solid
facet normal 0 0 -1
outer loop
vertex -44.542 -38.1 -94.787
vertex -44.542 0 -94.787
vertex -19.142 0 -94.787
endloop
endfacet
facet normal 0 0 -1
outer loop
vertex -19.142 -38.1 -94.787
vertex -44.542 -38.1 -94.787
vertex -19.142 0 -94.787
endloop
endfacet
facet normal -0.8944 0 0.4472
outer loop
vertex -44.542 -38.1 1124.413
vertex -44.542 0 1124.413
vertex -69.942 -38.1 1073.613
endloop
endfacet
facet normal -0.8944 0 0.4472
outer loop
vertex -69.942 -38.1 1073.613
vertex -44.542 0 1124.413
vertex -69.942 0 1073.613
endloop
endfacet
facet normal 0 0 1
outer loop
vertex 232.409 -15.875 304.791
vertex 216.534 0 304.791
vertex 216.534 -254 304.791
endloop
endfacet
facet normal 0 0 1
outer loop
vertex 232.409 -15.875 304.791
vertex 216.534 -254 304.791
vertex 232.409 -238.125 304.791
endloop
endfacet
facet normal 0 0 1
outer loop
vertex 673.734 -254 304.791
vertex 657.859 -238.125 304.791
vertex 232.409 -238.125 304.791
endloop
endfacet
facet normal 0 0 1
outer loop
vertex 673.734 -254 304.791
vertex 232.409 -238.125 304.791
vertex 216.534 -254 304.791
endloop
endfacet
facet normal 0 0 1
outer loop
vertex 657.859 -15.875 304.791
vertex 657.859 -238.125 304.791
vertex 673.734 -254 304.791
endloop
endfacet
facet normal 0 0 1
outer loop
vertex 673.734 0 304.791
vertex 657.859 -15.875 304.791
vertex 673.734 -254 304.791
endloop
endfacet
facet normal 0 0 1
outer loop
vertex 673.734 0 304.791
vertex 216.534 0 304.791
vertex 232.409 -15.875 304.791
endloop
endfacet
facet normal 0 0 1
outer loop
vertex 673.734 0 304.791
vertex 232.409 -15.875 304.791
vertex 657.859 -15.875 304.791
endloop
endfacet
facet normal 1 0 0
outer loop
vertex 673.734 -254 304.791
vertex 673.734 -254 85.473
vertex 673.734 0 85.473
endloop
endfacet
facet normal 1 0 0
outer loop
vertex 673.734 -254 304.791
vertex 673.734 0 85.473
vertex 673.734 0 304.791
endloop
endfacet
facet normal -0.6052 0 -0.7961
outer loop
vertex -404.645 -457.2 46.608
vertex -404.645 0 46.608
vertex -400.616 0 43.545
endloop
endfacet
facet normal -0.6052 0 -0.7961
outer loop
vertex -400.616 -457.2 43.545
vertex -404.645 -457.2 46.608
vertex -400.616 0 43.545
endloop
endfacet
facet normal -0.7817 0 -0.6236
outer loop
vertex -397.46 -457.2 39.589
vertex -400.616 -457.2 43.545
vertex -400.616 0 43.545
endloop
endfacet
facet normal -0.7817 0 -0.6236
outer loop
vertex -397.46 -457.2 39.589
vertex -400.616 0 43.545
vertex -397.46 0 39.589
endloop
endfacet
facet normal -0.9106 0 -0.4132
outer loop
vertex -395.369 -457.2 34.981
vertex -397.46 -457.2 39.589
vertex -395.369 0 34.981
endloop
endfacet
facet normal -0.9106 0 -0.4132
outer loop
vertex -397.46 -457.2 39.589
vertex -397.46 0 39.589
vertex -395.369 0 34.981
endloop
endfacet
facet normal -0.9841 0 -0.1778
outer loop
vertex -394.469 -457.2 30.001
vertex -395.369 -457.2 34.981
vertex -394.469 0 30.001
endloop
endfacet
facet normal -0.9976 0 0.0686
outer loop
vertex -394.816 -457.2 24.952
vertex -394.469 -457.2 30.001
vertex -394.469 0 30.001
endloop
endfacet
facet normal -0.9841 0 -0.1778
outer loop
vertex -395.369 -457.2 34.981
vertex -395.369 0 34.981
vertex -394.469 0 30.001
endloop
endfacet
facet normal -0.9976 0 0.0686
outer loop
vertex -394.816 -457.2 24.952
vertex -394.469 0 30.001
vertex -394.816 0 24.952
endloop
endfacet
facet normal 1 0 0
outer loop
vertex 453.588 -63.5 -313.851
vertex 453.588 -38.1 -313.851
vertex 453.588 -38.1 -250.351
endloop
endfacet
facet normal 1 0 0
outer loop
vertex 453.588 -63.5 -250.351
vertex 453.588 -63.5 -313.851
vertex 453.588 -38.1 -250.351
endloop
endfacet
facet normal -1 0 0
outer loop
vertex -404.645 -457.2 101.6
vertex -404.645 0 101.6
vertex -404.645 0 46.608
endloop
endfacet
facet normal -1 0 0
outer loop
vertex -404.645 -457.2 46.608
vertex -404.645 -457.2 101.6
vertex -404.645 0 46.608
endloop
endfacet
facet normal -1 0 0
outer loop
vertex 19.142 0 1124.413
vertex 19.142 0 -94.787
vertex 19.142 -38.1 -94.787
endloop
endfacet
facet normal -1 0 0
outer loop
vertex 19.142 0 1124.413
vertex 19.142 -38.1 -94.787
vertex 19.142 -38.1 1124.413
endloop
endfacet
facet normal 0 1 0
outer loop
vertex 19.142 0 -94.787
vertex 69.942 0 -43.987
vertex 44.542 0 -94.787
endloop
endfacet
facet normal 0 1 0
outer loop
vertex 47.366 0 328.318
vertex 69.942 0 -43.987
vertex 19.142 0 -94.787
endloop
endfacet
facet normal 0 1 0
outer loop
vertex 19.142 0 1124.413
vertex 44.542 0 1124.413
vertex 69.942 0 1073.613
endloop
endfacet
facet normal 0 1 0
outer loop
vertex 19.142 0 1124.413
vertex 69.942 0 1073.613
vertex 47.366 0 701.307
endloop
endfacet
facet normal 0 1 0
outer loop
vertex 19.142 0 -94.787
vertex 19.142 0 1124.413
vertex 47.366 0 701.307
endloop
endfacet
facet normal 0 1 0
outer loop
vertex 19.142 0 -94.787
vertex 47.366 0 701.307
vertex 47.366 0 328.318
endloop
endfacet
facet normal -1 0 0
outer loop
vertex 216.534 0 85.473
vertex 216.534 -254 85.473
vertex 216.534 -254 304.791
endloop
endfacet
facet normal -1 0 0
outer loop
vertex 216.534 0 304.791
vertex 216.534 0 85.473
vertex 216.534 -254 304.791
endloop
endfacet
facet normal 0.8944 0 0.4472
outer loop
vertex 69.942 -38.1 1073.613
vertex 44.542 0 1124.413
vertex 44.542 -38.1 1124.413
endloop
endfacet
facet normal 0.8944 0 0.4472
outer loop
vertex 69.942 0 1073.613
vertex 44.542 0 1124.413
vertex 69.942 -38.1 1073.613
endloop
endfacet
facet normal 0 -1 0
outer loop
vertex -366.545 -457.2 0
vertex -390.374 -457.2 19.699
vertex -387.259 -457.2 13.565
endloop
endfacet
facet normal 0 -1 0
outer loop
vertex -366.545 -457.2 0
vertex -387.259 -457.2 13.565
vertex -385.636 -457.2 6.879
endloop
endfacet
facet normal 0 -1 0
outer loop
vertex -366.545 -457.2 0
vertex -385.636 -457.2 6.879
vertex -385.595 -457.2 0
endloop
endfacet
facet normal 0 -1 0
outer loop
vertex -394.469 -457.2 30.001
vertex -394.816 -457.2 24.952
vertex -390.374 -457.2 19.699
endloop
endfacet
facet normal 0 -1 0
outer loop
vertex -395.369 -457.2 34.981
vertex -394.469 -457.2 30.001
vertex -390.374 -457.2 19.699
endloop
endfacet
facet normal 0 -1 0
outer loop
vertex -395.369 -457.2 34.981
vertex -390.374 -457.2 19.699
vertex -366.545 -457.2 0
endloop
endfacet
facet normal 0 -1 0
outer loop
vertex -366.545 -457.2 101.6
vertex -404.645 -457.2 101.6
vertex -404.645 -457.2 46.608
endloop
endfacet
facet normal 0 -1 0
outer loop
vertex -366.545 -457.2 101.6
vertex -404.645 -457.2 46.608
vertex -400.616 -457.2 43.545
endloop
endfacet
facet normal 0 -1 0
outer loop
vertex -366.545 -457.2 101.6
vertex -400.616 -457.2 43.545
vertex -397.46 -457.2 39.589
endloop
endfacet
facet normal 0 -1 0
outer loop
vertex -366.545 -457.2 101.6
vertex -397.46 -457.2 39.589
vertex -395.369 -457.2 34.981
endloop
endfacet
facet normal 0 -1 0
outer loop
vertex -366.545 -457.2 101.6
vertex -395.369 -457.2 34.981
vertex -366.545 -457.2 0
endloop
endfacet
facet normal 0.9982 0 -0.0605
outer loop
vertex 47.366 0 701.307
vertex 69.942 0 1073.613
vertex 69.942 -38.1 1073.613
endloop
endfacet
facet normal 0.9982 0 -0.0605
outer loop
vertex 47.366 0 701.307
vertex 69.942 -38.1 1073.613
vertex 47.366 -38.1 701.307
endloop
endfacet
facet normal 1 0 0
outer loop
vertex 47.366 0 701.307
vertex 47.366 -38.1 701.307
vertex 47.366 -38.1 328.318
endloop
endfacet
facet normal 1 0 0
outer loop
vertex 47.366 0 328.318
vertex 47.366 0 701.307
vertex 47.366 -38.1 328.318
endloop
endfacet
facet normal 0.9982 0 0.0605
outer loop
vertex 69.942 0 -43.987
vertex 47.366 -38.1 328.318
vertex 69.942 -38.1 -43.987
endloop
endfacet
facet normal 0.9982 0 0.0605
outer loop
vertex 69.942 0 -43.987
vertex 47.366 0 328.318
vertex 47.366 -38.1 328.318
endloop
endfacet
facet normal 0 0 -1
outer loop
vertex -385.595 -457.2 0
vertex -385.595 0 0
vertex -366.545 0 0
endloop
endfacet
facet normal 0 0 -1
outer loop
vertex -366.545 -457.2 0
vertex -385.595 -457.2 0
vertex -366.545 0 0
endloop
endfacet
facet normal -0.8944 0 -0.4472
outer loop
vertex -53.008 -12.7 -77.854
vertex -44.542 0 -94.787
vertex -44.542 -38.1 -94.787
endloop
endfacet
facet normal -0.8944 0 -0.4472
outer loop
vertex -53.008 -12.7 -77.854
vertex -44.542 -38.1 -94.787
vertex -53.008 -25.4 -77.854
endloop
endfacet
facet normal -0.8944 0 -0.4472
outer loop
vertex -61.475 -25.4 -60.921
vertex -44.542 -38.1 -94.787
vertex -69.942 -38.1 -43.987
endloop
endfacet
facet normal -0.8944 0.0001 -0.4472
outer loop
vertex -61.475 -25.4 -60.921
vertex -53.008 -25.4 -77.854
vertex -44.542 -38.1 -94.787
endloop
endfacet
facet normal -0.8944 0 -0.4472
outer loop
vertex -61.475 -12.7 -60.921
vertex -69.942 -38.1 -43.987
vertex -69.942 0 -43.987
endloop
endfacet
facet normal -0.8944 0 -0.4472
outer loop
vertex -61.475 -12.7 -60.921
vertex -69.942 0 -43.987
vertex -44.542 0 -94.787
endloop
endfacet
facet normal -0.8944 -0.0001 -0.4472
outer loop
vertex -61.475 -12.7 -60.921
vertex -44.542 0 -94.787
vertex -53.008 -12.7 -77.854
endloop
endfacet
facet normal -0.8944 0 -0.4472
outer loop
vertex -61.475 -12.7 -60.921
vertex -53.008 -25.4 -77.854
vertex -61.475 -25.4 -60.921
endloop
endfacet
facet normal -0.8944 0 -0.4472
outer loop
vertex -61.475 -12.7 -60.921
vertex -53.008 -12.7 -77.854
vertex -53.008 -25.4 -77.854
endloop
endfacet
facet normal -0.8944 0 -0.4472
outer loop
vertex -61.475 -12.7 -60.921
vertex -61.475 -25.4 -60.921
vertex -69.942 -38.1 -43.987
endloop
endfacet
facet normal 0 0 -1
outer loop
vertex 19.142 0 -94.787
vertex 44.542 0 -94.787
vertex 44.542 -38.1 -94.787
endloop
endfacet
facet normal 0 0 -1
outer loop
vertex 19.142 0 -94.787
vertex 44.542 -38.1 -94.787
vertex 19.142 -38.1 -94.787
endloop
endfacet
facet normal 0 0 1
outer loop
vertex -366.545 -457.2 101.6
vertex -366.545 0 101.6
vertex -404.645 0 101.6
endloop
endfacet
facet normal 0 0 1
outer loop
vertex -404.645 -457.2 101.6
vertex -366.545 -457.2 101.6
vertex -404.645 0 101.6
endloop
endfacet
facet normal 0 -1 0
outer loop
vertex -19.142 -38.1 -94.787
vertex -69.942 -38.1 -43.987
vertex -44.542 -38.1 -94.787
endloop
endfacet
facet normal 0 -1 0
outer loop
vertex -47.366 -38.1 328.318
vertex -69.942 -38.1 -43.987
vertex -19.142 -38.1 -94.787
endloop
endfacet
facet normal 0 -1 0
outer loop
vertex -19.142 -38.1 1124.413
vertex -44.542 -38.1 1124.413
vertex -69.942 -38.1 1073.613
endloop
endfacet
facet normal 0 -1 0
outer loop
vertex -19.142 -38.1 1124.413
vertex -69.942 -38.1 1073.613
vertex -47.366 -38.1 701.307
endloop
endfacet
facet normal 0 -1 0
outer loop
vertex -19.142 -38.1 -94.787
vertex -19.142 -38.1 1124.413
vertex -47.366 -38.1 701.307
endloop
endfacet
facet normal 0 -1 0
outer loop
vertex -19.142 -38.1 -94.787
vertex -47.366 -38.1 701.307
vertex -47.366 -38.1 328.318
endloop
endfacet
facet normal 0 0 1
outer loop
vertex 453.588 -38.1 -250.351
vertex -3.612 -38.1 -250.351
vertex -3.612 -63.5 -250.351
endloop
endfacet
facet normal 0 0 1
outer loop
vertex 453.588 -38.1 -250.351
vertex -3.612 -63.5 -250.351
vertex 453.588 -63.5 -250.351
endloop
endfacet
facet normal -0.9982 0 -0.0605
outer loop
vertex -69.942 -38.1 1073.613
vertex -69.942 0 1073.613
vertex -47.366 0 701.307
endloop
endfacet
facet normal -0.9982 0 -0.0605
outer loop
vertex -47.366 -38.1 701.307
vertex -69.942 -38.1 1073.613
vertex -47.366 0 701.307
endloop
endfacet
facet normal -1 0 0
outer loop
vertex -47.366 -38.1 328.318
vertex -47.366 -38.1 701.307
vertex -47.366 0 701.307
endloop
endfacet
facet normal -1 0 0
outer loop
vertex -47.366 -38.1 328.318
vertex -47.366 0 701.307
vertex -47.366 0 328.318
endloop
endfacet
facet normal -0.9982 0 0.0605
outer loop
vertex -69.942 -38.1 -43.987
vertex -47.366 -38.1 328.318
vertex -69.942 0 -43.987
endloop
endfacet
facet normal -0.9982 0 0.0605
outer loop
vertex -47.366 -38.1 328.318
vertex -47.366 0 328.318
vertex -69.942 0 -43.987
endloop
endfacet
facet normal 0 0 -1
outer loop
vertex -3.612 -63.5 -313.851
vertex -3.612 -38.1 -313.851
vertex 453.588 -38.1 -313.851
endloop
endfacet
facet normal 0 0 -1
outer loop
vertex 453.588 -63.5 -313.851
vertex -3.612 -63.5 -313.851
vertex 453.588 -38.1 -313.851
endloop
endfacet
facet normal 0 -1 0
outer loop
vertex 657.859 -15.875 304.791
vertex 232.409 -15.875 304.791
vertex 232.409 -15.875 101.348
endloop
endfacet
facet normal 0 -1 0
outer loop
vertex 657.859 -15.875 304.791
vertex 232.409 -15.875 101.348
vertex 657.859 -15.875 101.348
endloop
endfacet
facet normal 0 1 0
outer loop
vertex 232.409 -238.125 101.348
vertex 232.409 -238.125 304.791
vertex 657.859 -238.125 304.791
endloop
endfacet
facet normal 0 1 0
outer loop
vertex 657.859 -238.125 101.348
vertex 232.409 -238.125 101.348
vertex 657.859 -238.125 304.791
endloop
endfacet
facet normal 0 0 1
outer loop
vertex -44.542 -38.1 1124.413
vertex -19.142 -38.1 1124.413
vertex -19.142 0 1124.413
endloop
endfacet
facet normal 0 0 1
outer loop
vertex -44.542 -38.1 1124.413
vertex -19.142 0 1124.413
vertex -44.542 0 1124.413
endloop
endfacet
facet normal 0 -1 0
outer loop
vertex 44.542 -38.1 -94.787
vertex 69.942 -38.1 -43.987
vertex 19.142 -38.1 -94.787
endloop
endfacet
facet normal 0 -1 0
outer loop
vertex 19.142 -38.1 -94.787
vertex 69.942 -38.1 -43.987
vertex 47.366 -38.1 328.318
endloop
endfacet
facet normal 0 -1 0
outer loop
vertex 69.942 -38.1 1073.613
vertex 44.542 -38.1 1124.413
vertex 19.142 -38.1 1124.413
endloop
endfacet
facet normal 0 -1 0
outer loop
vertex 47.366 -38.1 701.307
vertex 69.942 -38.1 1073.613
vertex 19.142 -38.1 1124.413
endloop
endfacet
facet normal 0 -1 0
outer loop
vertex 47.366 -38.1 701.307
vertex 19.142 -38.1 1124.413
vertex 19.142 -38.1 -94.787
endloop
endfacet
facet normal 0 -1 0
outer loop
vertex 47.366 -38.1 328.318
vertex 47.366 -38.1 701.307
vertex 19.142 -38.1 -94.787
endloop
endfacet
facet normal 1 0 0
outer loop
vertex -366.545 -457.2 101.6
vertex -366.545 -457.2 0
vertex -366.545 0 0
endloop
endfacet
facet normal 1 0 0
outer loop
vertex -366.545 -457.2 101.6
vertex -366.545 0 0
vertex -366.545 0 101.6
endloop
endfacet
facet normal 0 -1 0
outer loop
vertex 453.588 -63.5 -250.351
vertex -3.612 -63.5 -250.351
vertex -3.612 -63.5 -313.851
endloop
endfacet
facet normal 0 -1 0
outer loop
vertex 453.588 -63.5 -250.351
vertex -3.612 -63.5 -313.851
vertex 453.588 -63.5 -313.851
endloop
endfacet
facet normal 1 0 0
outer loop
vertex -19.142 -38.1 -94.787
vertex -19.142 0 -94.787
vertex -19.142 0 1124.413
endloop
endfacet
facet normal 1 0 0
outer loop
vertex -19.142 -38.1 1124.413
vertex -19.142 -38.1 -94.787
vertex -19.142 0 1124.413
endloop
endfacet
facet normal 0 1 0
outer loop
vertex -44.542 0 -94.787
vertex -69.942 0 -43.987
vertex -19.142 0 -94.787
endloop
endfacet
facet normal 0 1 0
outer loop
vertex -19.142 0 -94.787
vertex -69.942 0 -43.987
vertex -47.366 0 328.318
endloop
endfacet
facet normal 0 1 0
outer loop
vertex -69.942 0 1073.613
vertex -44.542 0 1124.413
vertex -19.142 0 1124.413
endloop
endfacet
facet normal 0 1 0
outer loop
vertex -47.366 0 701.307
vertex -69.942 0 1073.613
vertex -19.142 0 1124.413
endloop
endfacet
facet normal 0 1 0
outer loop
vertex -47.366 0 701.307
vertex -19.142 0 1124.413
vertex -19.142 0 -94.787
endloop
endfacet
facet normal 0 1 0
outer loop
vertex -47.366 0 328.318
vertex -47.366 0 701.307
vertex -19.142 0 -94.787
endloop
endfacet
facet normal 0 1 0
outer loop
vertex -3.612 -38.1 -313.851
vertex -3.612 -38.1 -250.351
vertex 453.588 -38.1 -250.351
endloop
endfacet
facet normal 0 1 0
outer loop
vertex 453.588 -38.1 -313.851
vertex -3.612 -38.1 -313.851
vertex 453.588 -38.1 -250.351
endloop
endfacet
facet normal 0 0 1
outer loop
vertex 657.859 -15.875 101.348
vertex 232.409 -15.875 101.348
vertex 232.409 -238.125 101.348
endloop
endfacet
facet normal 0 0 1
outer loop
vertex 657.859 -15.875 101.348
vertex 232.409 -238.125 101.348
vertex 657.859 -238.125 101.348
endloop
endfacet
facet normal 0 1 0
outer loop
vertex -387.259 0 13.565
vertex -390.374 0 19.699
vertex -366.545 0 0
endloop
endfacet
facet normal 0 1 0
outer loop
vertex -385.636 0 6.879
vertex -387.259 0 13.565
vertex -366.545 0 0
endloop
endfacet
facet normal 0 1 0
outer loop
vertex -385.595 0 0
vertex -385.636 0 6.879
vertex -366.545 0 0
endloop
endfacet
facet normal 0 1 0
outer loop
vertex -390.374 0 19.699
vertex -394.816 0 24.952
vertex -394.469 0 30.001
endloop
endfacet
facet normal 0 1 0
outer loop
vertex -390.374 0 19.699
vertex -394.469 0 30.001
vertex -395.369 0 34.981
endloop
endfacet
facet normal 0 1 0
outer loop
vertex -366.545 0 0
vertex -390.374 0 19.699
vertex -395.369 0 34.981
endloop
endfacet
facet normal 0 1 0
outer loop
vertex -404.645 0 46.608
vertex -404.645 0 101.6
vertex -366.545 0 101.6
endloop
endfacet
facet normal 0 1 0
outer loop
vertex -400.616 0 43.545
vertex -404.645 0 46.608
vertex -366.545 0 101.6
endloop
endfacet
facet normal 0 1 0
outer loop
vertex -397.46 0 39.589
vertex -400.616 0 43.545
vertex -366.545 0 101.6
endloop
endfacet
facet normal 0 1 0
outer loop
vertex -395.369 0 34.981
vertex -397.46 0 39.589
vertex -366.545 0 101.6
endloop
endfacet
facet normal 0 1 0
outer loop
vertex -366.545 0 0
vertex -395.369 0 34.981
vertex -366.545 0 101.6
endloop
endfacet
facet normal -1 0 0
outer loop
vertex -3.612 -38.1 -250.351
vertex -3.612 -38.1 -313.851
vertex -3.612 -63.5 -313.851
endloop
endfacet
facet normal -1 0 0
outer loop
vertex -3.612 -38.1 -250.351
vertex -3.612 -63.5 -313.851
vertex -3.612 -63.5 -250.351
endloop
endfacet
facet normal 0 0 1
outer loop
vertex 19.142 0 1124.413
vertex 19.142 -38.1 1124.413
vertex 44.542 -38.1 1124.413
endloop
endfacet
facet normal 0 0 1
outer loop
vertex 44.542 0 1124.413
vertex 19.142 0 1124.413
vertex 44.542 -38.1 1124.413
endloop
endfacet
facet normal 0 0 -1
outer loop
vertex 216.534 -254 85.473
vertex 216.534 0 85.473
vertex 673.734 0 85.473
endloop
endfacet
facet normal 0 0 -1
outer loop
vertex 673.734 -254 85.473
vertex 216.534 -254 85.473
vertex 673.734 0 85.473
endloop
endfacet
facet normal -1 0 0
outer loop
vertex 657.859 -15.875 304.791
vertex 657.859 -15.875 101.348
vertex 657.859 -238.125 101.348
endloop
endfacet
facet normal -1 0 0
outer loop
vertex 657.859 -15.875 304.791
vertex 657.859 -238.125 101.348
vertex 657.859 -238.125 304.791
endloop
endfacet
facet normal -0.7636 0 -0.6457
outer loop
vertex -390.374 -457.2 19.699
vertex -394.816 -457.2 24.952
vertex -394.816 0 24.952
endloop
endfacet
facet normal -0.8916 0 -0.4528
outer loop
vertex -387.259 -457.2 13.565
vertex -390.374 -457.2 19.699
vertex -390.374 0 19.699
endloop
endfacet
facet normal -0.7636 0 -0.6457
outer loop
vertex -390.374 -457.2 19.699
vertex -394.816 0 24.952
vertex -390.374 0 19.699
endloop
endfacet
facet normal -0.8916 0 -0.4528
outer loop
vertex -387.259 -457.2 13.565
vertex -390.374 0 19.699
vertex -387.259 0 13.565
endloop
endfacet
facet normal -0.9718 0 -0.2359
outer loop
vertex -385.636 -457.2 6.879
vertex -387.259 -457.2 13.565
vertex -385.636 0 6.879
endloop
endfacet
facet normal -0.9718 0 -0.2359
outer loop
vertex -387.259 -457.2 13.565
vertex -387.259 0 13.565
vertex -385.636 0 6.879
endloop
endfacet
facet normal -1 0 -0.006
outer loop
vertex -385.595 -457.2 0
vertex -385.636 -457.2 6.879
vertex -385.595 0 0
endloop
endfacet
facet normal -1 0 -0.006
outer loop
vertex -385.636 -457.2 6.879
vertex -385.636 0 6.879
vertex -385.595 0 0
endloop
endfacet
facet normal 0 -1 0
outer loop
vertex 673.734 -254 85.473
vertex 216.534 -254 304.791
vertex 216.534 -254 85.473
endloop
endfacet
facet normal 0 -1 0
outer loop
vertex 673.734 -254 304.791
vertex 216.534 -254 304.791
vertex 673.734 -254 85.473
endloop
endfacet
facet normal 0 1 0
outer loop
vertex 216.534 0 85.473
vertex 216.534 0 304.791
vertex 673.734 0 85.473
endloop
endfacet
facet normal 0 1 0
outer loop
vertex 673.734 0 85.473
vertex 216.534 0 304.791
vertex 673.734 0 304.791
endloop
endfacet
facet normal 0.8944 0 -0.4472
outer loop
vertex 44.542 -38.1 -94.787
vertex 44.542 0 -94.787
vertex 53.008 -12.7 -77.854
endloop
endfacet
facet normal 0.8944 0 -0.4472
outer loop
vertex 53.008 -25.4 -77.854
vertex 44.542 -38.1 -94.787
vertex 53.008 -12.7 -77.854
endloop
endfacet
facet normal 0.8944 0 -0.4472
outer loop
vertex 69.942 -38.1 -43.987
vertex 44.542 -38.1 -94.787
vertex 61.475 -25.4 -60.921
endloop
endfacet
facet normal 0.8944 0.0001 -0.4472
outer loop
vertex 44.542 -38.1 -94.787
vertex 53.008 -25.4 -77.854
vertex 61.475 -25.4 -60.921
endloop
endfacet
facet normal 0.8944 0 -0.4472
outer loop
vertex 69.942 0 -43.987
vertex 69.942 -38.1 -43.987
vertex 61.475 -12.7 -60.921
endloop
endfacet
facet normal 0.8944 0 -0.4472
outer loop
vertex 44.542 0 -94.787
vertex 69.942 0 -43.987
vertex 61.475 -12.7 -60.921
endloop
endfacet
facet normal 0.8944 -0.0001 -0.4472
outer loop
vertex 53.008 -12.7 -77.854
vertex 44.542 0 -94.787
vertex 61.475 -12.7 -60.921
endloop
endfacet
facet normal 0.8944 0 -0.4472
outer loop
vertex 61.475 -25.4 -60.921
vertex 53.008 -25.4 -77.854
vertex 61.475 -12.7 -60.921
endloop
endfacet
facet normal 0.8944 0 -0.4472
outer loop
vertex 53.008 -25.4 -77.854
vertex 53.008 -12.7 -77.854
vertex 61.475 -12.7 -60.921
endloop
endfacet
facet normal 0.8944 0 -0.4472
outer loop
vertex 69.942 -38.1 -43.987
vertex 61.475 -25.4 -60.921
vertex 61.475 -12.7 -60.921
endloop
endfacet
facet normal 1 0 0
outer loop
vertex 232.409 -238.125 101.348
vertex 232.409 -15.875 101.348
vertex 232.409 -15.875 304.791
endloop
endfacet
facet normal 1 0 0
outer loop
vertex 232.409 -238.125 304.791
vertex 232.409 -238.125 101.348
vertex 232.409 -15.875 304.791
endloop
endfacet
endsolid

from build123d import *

# Parameters (mm, degrees)
F1_DEPTH = 38.1
F3_W     = 457.2
F3_H     = 63.5
F4_DEPTH = 25.4
F6_DEPTH = 457.2
F7_W     = 457.2
F7_H     = 219.317734
F8_DEPTH = 254
F9_T     = -15.875


with BuildPart() as f1:
    # F0 (on Front) → F1 (new body)
    with BuildSketch(Plane.XZ):
        with BuildLine():
            Line((-19.14165, 1124.412804), (-44.54165, 1124.412804))
            Line((-44.54165, 1124.412804), (-69.94165, 1073.612804))
            ThreePointArc((-69.94165, 1073.612804), (-44.54165, 514.812804), (-69.94165, -43.987196))
            add(Edge.make_bspline(
                [(-44.54165, -94.787196), (-53.008317, -77.853863), (-61.474984, -60.92053), (-69.94165, -43.987196)],
                knots=[0, 0, 0, 0, 56.796127, 56.796127, 56.796127, 56.796127], degree=3))
            Line((-44.54165, -94.787196), (-19.14165, -94.787196))
            Line((-19.14165, -94.787196), (-19.14165, 1124.412804))
        make_face()
    extrude(amount=F1_DEPTH)


with BuildPart() as f2_1:
    # F2: instance of F1
    add(f1.part.mirror(Plane.YZ))


with BuildPart() as f4:
    # F3 (on face) → F4 (new body)
    with BuildSketch(Plane.XZ.offset(38.1)):
        with Locations((224.988334, -282.101117)):
            Rectangle(F3_W, F3_H)
    extrude(amount=F4_DEPTH)


with BuildPart() as f6:
    # F5 (on Front) → F6 (new body)
    with BuildSketch(Plane.XZ):
        with BuildLine():
            Line((-366.544515, 101.6), (-404.644515, 101.6))
            Line((-404.644515, 101.6), (-404.644515, 46.607811))
            ThreePointArc((-404.644515, 46.607811), (-396.271765, 37.349523), (-394.815819, 24.951981))
            ThreePointArc((-394.815819, 24.951981), (-387.258526, 13.564957), (-385.594515, 0))
            Line((-385.594515, 0), (-366.544515, 0))
            Line((-366.544515, 0), (-366.544515, 101.6))
        make_face()
    extrude(amount=F6_DEPTH)


with BuildPart() as f8:
    # F7 (on Front) → F8 (new body)
    with BuildSketch(Plane.XZ):
        with Locations((445.133593, 195.132071)):
            Rectangle(F7_W, F7_H)
    extrude(amount=F8_DEPTH)

    # F9
    f9_openings = [f8.faces().sort_by_distance(p)[0] for p in [
        (445.133593, -127, 304.790938),
    ]]
    offset(amount=F9_T, openings=f9_openings)


solid = Compound([f1.part, f2_1.part, f4.part, f6.part, f8.part])
